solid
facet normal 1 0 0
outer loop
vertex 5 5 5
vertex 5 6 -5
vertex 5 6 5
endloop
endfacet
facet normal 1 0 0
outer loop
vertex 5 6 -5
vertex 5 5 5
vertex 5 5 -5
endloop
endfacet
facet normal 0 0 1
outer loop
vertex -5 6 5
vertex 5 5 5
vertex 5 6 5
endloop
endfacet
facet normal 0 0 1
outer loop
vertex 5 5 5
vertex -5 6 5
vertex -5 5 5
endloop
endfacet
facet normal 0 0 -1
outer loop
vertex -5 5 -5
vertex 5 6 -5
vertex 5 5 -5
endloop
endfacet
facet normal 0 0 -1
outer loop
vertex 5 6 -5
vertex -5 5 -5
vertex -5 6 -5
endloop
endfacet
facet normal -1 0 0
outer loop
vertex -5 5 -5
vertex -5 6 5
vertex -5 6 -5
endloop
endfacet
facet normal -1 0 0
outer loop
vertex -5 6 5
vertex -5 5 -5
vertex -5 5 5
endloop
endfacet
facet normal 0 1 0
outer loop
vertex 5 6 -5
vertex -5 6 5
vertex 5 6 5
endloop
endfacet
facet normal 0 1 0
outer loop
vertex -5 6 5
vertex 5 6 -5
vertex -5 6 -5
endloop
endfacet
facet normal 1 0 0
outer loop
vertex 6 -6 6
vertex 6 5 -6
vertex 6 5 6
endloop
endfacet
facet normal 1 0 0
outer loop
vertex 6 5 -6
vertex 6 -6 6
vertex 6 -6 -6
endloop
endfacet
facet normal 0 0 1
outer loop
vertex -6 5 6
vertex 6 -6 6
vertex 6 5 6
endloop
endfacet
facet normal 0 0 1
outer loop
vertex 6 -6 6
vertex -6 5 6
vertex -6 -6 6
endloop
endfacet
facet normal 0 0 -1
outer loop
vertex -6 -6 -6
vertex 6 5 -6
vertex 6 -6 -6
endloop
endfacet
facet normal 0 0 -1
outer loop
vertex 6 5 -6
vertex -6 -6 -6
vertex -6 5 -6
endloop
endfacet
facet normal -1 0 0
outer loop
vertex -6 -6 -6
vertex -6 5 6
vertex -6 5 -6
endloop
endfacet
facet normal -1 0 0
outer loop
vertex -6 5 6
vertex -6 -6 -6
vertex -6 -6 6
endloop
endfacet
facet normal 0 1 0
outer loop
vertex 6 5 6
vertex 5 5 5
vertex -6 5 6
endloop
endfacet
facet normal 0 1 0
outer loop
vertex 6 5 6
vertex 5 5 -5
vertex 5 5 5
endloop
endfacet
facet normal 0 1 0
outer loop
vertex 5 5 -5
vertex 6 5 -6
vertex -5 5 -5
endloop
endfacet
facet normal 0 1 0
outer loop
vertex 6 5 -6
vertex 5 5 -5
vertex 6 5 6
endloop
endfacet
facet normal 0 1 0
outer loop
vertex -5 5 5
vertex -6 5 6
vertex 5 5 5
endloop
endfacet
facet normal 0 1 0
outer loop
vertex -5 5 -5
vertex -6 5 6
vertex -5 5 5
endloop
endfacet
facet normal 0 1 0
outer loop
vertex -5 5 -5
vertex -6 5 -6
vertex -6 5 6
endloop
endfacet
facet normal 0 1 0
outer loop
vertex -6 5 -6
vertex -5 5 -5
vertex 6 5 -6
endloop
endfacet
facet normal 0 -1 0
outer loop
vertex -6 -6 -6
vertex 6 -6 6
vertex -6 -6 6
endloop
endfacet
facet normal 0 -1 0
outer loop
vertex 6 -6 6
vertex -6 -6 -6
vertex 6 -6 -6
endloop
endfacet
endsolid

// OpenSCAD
// Unit of length: Unit.MM
union()
{
   color(c = [1.0, 0.0, 0.0, 1.0])
   {
      translate(v = [0.0, 0.5, 0.0])
      {
         cube(size = [10.0, 11.0, 10.0], center = true);
      }
   }
   translate(v = [0.0, -0.5, 0.0])
   {
      cube(size = [12.0, 11.0, 12.0], center = true);
   }
}
